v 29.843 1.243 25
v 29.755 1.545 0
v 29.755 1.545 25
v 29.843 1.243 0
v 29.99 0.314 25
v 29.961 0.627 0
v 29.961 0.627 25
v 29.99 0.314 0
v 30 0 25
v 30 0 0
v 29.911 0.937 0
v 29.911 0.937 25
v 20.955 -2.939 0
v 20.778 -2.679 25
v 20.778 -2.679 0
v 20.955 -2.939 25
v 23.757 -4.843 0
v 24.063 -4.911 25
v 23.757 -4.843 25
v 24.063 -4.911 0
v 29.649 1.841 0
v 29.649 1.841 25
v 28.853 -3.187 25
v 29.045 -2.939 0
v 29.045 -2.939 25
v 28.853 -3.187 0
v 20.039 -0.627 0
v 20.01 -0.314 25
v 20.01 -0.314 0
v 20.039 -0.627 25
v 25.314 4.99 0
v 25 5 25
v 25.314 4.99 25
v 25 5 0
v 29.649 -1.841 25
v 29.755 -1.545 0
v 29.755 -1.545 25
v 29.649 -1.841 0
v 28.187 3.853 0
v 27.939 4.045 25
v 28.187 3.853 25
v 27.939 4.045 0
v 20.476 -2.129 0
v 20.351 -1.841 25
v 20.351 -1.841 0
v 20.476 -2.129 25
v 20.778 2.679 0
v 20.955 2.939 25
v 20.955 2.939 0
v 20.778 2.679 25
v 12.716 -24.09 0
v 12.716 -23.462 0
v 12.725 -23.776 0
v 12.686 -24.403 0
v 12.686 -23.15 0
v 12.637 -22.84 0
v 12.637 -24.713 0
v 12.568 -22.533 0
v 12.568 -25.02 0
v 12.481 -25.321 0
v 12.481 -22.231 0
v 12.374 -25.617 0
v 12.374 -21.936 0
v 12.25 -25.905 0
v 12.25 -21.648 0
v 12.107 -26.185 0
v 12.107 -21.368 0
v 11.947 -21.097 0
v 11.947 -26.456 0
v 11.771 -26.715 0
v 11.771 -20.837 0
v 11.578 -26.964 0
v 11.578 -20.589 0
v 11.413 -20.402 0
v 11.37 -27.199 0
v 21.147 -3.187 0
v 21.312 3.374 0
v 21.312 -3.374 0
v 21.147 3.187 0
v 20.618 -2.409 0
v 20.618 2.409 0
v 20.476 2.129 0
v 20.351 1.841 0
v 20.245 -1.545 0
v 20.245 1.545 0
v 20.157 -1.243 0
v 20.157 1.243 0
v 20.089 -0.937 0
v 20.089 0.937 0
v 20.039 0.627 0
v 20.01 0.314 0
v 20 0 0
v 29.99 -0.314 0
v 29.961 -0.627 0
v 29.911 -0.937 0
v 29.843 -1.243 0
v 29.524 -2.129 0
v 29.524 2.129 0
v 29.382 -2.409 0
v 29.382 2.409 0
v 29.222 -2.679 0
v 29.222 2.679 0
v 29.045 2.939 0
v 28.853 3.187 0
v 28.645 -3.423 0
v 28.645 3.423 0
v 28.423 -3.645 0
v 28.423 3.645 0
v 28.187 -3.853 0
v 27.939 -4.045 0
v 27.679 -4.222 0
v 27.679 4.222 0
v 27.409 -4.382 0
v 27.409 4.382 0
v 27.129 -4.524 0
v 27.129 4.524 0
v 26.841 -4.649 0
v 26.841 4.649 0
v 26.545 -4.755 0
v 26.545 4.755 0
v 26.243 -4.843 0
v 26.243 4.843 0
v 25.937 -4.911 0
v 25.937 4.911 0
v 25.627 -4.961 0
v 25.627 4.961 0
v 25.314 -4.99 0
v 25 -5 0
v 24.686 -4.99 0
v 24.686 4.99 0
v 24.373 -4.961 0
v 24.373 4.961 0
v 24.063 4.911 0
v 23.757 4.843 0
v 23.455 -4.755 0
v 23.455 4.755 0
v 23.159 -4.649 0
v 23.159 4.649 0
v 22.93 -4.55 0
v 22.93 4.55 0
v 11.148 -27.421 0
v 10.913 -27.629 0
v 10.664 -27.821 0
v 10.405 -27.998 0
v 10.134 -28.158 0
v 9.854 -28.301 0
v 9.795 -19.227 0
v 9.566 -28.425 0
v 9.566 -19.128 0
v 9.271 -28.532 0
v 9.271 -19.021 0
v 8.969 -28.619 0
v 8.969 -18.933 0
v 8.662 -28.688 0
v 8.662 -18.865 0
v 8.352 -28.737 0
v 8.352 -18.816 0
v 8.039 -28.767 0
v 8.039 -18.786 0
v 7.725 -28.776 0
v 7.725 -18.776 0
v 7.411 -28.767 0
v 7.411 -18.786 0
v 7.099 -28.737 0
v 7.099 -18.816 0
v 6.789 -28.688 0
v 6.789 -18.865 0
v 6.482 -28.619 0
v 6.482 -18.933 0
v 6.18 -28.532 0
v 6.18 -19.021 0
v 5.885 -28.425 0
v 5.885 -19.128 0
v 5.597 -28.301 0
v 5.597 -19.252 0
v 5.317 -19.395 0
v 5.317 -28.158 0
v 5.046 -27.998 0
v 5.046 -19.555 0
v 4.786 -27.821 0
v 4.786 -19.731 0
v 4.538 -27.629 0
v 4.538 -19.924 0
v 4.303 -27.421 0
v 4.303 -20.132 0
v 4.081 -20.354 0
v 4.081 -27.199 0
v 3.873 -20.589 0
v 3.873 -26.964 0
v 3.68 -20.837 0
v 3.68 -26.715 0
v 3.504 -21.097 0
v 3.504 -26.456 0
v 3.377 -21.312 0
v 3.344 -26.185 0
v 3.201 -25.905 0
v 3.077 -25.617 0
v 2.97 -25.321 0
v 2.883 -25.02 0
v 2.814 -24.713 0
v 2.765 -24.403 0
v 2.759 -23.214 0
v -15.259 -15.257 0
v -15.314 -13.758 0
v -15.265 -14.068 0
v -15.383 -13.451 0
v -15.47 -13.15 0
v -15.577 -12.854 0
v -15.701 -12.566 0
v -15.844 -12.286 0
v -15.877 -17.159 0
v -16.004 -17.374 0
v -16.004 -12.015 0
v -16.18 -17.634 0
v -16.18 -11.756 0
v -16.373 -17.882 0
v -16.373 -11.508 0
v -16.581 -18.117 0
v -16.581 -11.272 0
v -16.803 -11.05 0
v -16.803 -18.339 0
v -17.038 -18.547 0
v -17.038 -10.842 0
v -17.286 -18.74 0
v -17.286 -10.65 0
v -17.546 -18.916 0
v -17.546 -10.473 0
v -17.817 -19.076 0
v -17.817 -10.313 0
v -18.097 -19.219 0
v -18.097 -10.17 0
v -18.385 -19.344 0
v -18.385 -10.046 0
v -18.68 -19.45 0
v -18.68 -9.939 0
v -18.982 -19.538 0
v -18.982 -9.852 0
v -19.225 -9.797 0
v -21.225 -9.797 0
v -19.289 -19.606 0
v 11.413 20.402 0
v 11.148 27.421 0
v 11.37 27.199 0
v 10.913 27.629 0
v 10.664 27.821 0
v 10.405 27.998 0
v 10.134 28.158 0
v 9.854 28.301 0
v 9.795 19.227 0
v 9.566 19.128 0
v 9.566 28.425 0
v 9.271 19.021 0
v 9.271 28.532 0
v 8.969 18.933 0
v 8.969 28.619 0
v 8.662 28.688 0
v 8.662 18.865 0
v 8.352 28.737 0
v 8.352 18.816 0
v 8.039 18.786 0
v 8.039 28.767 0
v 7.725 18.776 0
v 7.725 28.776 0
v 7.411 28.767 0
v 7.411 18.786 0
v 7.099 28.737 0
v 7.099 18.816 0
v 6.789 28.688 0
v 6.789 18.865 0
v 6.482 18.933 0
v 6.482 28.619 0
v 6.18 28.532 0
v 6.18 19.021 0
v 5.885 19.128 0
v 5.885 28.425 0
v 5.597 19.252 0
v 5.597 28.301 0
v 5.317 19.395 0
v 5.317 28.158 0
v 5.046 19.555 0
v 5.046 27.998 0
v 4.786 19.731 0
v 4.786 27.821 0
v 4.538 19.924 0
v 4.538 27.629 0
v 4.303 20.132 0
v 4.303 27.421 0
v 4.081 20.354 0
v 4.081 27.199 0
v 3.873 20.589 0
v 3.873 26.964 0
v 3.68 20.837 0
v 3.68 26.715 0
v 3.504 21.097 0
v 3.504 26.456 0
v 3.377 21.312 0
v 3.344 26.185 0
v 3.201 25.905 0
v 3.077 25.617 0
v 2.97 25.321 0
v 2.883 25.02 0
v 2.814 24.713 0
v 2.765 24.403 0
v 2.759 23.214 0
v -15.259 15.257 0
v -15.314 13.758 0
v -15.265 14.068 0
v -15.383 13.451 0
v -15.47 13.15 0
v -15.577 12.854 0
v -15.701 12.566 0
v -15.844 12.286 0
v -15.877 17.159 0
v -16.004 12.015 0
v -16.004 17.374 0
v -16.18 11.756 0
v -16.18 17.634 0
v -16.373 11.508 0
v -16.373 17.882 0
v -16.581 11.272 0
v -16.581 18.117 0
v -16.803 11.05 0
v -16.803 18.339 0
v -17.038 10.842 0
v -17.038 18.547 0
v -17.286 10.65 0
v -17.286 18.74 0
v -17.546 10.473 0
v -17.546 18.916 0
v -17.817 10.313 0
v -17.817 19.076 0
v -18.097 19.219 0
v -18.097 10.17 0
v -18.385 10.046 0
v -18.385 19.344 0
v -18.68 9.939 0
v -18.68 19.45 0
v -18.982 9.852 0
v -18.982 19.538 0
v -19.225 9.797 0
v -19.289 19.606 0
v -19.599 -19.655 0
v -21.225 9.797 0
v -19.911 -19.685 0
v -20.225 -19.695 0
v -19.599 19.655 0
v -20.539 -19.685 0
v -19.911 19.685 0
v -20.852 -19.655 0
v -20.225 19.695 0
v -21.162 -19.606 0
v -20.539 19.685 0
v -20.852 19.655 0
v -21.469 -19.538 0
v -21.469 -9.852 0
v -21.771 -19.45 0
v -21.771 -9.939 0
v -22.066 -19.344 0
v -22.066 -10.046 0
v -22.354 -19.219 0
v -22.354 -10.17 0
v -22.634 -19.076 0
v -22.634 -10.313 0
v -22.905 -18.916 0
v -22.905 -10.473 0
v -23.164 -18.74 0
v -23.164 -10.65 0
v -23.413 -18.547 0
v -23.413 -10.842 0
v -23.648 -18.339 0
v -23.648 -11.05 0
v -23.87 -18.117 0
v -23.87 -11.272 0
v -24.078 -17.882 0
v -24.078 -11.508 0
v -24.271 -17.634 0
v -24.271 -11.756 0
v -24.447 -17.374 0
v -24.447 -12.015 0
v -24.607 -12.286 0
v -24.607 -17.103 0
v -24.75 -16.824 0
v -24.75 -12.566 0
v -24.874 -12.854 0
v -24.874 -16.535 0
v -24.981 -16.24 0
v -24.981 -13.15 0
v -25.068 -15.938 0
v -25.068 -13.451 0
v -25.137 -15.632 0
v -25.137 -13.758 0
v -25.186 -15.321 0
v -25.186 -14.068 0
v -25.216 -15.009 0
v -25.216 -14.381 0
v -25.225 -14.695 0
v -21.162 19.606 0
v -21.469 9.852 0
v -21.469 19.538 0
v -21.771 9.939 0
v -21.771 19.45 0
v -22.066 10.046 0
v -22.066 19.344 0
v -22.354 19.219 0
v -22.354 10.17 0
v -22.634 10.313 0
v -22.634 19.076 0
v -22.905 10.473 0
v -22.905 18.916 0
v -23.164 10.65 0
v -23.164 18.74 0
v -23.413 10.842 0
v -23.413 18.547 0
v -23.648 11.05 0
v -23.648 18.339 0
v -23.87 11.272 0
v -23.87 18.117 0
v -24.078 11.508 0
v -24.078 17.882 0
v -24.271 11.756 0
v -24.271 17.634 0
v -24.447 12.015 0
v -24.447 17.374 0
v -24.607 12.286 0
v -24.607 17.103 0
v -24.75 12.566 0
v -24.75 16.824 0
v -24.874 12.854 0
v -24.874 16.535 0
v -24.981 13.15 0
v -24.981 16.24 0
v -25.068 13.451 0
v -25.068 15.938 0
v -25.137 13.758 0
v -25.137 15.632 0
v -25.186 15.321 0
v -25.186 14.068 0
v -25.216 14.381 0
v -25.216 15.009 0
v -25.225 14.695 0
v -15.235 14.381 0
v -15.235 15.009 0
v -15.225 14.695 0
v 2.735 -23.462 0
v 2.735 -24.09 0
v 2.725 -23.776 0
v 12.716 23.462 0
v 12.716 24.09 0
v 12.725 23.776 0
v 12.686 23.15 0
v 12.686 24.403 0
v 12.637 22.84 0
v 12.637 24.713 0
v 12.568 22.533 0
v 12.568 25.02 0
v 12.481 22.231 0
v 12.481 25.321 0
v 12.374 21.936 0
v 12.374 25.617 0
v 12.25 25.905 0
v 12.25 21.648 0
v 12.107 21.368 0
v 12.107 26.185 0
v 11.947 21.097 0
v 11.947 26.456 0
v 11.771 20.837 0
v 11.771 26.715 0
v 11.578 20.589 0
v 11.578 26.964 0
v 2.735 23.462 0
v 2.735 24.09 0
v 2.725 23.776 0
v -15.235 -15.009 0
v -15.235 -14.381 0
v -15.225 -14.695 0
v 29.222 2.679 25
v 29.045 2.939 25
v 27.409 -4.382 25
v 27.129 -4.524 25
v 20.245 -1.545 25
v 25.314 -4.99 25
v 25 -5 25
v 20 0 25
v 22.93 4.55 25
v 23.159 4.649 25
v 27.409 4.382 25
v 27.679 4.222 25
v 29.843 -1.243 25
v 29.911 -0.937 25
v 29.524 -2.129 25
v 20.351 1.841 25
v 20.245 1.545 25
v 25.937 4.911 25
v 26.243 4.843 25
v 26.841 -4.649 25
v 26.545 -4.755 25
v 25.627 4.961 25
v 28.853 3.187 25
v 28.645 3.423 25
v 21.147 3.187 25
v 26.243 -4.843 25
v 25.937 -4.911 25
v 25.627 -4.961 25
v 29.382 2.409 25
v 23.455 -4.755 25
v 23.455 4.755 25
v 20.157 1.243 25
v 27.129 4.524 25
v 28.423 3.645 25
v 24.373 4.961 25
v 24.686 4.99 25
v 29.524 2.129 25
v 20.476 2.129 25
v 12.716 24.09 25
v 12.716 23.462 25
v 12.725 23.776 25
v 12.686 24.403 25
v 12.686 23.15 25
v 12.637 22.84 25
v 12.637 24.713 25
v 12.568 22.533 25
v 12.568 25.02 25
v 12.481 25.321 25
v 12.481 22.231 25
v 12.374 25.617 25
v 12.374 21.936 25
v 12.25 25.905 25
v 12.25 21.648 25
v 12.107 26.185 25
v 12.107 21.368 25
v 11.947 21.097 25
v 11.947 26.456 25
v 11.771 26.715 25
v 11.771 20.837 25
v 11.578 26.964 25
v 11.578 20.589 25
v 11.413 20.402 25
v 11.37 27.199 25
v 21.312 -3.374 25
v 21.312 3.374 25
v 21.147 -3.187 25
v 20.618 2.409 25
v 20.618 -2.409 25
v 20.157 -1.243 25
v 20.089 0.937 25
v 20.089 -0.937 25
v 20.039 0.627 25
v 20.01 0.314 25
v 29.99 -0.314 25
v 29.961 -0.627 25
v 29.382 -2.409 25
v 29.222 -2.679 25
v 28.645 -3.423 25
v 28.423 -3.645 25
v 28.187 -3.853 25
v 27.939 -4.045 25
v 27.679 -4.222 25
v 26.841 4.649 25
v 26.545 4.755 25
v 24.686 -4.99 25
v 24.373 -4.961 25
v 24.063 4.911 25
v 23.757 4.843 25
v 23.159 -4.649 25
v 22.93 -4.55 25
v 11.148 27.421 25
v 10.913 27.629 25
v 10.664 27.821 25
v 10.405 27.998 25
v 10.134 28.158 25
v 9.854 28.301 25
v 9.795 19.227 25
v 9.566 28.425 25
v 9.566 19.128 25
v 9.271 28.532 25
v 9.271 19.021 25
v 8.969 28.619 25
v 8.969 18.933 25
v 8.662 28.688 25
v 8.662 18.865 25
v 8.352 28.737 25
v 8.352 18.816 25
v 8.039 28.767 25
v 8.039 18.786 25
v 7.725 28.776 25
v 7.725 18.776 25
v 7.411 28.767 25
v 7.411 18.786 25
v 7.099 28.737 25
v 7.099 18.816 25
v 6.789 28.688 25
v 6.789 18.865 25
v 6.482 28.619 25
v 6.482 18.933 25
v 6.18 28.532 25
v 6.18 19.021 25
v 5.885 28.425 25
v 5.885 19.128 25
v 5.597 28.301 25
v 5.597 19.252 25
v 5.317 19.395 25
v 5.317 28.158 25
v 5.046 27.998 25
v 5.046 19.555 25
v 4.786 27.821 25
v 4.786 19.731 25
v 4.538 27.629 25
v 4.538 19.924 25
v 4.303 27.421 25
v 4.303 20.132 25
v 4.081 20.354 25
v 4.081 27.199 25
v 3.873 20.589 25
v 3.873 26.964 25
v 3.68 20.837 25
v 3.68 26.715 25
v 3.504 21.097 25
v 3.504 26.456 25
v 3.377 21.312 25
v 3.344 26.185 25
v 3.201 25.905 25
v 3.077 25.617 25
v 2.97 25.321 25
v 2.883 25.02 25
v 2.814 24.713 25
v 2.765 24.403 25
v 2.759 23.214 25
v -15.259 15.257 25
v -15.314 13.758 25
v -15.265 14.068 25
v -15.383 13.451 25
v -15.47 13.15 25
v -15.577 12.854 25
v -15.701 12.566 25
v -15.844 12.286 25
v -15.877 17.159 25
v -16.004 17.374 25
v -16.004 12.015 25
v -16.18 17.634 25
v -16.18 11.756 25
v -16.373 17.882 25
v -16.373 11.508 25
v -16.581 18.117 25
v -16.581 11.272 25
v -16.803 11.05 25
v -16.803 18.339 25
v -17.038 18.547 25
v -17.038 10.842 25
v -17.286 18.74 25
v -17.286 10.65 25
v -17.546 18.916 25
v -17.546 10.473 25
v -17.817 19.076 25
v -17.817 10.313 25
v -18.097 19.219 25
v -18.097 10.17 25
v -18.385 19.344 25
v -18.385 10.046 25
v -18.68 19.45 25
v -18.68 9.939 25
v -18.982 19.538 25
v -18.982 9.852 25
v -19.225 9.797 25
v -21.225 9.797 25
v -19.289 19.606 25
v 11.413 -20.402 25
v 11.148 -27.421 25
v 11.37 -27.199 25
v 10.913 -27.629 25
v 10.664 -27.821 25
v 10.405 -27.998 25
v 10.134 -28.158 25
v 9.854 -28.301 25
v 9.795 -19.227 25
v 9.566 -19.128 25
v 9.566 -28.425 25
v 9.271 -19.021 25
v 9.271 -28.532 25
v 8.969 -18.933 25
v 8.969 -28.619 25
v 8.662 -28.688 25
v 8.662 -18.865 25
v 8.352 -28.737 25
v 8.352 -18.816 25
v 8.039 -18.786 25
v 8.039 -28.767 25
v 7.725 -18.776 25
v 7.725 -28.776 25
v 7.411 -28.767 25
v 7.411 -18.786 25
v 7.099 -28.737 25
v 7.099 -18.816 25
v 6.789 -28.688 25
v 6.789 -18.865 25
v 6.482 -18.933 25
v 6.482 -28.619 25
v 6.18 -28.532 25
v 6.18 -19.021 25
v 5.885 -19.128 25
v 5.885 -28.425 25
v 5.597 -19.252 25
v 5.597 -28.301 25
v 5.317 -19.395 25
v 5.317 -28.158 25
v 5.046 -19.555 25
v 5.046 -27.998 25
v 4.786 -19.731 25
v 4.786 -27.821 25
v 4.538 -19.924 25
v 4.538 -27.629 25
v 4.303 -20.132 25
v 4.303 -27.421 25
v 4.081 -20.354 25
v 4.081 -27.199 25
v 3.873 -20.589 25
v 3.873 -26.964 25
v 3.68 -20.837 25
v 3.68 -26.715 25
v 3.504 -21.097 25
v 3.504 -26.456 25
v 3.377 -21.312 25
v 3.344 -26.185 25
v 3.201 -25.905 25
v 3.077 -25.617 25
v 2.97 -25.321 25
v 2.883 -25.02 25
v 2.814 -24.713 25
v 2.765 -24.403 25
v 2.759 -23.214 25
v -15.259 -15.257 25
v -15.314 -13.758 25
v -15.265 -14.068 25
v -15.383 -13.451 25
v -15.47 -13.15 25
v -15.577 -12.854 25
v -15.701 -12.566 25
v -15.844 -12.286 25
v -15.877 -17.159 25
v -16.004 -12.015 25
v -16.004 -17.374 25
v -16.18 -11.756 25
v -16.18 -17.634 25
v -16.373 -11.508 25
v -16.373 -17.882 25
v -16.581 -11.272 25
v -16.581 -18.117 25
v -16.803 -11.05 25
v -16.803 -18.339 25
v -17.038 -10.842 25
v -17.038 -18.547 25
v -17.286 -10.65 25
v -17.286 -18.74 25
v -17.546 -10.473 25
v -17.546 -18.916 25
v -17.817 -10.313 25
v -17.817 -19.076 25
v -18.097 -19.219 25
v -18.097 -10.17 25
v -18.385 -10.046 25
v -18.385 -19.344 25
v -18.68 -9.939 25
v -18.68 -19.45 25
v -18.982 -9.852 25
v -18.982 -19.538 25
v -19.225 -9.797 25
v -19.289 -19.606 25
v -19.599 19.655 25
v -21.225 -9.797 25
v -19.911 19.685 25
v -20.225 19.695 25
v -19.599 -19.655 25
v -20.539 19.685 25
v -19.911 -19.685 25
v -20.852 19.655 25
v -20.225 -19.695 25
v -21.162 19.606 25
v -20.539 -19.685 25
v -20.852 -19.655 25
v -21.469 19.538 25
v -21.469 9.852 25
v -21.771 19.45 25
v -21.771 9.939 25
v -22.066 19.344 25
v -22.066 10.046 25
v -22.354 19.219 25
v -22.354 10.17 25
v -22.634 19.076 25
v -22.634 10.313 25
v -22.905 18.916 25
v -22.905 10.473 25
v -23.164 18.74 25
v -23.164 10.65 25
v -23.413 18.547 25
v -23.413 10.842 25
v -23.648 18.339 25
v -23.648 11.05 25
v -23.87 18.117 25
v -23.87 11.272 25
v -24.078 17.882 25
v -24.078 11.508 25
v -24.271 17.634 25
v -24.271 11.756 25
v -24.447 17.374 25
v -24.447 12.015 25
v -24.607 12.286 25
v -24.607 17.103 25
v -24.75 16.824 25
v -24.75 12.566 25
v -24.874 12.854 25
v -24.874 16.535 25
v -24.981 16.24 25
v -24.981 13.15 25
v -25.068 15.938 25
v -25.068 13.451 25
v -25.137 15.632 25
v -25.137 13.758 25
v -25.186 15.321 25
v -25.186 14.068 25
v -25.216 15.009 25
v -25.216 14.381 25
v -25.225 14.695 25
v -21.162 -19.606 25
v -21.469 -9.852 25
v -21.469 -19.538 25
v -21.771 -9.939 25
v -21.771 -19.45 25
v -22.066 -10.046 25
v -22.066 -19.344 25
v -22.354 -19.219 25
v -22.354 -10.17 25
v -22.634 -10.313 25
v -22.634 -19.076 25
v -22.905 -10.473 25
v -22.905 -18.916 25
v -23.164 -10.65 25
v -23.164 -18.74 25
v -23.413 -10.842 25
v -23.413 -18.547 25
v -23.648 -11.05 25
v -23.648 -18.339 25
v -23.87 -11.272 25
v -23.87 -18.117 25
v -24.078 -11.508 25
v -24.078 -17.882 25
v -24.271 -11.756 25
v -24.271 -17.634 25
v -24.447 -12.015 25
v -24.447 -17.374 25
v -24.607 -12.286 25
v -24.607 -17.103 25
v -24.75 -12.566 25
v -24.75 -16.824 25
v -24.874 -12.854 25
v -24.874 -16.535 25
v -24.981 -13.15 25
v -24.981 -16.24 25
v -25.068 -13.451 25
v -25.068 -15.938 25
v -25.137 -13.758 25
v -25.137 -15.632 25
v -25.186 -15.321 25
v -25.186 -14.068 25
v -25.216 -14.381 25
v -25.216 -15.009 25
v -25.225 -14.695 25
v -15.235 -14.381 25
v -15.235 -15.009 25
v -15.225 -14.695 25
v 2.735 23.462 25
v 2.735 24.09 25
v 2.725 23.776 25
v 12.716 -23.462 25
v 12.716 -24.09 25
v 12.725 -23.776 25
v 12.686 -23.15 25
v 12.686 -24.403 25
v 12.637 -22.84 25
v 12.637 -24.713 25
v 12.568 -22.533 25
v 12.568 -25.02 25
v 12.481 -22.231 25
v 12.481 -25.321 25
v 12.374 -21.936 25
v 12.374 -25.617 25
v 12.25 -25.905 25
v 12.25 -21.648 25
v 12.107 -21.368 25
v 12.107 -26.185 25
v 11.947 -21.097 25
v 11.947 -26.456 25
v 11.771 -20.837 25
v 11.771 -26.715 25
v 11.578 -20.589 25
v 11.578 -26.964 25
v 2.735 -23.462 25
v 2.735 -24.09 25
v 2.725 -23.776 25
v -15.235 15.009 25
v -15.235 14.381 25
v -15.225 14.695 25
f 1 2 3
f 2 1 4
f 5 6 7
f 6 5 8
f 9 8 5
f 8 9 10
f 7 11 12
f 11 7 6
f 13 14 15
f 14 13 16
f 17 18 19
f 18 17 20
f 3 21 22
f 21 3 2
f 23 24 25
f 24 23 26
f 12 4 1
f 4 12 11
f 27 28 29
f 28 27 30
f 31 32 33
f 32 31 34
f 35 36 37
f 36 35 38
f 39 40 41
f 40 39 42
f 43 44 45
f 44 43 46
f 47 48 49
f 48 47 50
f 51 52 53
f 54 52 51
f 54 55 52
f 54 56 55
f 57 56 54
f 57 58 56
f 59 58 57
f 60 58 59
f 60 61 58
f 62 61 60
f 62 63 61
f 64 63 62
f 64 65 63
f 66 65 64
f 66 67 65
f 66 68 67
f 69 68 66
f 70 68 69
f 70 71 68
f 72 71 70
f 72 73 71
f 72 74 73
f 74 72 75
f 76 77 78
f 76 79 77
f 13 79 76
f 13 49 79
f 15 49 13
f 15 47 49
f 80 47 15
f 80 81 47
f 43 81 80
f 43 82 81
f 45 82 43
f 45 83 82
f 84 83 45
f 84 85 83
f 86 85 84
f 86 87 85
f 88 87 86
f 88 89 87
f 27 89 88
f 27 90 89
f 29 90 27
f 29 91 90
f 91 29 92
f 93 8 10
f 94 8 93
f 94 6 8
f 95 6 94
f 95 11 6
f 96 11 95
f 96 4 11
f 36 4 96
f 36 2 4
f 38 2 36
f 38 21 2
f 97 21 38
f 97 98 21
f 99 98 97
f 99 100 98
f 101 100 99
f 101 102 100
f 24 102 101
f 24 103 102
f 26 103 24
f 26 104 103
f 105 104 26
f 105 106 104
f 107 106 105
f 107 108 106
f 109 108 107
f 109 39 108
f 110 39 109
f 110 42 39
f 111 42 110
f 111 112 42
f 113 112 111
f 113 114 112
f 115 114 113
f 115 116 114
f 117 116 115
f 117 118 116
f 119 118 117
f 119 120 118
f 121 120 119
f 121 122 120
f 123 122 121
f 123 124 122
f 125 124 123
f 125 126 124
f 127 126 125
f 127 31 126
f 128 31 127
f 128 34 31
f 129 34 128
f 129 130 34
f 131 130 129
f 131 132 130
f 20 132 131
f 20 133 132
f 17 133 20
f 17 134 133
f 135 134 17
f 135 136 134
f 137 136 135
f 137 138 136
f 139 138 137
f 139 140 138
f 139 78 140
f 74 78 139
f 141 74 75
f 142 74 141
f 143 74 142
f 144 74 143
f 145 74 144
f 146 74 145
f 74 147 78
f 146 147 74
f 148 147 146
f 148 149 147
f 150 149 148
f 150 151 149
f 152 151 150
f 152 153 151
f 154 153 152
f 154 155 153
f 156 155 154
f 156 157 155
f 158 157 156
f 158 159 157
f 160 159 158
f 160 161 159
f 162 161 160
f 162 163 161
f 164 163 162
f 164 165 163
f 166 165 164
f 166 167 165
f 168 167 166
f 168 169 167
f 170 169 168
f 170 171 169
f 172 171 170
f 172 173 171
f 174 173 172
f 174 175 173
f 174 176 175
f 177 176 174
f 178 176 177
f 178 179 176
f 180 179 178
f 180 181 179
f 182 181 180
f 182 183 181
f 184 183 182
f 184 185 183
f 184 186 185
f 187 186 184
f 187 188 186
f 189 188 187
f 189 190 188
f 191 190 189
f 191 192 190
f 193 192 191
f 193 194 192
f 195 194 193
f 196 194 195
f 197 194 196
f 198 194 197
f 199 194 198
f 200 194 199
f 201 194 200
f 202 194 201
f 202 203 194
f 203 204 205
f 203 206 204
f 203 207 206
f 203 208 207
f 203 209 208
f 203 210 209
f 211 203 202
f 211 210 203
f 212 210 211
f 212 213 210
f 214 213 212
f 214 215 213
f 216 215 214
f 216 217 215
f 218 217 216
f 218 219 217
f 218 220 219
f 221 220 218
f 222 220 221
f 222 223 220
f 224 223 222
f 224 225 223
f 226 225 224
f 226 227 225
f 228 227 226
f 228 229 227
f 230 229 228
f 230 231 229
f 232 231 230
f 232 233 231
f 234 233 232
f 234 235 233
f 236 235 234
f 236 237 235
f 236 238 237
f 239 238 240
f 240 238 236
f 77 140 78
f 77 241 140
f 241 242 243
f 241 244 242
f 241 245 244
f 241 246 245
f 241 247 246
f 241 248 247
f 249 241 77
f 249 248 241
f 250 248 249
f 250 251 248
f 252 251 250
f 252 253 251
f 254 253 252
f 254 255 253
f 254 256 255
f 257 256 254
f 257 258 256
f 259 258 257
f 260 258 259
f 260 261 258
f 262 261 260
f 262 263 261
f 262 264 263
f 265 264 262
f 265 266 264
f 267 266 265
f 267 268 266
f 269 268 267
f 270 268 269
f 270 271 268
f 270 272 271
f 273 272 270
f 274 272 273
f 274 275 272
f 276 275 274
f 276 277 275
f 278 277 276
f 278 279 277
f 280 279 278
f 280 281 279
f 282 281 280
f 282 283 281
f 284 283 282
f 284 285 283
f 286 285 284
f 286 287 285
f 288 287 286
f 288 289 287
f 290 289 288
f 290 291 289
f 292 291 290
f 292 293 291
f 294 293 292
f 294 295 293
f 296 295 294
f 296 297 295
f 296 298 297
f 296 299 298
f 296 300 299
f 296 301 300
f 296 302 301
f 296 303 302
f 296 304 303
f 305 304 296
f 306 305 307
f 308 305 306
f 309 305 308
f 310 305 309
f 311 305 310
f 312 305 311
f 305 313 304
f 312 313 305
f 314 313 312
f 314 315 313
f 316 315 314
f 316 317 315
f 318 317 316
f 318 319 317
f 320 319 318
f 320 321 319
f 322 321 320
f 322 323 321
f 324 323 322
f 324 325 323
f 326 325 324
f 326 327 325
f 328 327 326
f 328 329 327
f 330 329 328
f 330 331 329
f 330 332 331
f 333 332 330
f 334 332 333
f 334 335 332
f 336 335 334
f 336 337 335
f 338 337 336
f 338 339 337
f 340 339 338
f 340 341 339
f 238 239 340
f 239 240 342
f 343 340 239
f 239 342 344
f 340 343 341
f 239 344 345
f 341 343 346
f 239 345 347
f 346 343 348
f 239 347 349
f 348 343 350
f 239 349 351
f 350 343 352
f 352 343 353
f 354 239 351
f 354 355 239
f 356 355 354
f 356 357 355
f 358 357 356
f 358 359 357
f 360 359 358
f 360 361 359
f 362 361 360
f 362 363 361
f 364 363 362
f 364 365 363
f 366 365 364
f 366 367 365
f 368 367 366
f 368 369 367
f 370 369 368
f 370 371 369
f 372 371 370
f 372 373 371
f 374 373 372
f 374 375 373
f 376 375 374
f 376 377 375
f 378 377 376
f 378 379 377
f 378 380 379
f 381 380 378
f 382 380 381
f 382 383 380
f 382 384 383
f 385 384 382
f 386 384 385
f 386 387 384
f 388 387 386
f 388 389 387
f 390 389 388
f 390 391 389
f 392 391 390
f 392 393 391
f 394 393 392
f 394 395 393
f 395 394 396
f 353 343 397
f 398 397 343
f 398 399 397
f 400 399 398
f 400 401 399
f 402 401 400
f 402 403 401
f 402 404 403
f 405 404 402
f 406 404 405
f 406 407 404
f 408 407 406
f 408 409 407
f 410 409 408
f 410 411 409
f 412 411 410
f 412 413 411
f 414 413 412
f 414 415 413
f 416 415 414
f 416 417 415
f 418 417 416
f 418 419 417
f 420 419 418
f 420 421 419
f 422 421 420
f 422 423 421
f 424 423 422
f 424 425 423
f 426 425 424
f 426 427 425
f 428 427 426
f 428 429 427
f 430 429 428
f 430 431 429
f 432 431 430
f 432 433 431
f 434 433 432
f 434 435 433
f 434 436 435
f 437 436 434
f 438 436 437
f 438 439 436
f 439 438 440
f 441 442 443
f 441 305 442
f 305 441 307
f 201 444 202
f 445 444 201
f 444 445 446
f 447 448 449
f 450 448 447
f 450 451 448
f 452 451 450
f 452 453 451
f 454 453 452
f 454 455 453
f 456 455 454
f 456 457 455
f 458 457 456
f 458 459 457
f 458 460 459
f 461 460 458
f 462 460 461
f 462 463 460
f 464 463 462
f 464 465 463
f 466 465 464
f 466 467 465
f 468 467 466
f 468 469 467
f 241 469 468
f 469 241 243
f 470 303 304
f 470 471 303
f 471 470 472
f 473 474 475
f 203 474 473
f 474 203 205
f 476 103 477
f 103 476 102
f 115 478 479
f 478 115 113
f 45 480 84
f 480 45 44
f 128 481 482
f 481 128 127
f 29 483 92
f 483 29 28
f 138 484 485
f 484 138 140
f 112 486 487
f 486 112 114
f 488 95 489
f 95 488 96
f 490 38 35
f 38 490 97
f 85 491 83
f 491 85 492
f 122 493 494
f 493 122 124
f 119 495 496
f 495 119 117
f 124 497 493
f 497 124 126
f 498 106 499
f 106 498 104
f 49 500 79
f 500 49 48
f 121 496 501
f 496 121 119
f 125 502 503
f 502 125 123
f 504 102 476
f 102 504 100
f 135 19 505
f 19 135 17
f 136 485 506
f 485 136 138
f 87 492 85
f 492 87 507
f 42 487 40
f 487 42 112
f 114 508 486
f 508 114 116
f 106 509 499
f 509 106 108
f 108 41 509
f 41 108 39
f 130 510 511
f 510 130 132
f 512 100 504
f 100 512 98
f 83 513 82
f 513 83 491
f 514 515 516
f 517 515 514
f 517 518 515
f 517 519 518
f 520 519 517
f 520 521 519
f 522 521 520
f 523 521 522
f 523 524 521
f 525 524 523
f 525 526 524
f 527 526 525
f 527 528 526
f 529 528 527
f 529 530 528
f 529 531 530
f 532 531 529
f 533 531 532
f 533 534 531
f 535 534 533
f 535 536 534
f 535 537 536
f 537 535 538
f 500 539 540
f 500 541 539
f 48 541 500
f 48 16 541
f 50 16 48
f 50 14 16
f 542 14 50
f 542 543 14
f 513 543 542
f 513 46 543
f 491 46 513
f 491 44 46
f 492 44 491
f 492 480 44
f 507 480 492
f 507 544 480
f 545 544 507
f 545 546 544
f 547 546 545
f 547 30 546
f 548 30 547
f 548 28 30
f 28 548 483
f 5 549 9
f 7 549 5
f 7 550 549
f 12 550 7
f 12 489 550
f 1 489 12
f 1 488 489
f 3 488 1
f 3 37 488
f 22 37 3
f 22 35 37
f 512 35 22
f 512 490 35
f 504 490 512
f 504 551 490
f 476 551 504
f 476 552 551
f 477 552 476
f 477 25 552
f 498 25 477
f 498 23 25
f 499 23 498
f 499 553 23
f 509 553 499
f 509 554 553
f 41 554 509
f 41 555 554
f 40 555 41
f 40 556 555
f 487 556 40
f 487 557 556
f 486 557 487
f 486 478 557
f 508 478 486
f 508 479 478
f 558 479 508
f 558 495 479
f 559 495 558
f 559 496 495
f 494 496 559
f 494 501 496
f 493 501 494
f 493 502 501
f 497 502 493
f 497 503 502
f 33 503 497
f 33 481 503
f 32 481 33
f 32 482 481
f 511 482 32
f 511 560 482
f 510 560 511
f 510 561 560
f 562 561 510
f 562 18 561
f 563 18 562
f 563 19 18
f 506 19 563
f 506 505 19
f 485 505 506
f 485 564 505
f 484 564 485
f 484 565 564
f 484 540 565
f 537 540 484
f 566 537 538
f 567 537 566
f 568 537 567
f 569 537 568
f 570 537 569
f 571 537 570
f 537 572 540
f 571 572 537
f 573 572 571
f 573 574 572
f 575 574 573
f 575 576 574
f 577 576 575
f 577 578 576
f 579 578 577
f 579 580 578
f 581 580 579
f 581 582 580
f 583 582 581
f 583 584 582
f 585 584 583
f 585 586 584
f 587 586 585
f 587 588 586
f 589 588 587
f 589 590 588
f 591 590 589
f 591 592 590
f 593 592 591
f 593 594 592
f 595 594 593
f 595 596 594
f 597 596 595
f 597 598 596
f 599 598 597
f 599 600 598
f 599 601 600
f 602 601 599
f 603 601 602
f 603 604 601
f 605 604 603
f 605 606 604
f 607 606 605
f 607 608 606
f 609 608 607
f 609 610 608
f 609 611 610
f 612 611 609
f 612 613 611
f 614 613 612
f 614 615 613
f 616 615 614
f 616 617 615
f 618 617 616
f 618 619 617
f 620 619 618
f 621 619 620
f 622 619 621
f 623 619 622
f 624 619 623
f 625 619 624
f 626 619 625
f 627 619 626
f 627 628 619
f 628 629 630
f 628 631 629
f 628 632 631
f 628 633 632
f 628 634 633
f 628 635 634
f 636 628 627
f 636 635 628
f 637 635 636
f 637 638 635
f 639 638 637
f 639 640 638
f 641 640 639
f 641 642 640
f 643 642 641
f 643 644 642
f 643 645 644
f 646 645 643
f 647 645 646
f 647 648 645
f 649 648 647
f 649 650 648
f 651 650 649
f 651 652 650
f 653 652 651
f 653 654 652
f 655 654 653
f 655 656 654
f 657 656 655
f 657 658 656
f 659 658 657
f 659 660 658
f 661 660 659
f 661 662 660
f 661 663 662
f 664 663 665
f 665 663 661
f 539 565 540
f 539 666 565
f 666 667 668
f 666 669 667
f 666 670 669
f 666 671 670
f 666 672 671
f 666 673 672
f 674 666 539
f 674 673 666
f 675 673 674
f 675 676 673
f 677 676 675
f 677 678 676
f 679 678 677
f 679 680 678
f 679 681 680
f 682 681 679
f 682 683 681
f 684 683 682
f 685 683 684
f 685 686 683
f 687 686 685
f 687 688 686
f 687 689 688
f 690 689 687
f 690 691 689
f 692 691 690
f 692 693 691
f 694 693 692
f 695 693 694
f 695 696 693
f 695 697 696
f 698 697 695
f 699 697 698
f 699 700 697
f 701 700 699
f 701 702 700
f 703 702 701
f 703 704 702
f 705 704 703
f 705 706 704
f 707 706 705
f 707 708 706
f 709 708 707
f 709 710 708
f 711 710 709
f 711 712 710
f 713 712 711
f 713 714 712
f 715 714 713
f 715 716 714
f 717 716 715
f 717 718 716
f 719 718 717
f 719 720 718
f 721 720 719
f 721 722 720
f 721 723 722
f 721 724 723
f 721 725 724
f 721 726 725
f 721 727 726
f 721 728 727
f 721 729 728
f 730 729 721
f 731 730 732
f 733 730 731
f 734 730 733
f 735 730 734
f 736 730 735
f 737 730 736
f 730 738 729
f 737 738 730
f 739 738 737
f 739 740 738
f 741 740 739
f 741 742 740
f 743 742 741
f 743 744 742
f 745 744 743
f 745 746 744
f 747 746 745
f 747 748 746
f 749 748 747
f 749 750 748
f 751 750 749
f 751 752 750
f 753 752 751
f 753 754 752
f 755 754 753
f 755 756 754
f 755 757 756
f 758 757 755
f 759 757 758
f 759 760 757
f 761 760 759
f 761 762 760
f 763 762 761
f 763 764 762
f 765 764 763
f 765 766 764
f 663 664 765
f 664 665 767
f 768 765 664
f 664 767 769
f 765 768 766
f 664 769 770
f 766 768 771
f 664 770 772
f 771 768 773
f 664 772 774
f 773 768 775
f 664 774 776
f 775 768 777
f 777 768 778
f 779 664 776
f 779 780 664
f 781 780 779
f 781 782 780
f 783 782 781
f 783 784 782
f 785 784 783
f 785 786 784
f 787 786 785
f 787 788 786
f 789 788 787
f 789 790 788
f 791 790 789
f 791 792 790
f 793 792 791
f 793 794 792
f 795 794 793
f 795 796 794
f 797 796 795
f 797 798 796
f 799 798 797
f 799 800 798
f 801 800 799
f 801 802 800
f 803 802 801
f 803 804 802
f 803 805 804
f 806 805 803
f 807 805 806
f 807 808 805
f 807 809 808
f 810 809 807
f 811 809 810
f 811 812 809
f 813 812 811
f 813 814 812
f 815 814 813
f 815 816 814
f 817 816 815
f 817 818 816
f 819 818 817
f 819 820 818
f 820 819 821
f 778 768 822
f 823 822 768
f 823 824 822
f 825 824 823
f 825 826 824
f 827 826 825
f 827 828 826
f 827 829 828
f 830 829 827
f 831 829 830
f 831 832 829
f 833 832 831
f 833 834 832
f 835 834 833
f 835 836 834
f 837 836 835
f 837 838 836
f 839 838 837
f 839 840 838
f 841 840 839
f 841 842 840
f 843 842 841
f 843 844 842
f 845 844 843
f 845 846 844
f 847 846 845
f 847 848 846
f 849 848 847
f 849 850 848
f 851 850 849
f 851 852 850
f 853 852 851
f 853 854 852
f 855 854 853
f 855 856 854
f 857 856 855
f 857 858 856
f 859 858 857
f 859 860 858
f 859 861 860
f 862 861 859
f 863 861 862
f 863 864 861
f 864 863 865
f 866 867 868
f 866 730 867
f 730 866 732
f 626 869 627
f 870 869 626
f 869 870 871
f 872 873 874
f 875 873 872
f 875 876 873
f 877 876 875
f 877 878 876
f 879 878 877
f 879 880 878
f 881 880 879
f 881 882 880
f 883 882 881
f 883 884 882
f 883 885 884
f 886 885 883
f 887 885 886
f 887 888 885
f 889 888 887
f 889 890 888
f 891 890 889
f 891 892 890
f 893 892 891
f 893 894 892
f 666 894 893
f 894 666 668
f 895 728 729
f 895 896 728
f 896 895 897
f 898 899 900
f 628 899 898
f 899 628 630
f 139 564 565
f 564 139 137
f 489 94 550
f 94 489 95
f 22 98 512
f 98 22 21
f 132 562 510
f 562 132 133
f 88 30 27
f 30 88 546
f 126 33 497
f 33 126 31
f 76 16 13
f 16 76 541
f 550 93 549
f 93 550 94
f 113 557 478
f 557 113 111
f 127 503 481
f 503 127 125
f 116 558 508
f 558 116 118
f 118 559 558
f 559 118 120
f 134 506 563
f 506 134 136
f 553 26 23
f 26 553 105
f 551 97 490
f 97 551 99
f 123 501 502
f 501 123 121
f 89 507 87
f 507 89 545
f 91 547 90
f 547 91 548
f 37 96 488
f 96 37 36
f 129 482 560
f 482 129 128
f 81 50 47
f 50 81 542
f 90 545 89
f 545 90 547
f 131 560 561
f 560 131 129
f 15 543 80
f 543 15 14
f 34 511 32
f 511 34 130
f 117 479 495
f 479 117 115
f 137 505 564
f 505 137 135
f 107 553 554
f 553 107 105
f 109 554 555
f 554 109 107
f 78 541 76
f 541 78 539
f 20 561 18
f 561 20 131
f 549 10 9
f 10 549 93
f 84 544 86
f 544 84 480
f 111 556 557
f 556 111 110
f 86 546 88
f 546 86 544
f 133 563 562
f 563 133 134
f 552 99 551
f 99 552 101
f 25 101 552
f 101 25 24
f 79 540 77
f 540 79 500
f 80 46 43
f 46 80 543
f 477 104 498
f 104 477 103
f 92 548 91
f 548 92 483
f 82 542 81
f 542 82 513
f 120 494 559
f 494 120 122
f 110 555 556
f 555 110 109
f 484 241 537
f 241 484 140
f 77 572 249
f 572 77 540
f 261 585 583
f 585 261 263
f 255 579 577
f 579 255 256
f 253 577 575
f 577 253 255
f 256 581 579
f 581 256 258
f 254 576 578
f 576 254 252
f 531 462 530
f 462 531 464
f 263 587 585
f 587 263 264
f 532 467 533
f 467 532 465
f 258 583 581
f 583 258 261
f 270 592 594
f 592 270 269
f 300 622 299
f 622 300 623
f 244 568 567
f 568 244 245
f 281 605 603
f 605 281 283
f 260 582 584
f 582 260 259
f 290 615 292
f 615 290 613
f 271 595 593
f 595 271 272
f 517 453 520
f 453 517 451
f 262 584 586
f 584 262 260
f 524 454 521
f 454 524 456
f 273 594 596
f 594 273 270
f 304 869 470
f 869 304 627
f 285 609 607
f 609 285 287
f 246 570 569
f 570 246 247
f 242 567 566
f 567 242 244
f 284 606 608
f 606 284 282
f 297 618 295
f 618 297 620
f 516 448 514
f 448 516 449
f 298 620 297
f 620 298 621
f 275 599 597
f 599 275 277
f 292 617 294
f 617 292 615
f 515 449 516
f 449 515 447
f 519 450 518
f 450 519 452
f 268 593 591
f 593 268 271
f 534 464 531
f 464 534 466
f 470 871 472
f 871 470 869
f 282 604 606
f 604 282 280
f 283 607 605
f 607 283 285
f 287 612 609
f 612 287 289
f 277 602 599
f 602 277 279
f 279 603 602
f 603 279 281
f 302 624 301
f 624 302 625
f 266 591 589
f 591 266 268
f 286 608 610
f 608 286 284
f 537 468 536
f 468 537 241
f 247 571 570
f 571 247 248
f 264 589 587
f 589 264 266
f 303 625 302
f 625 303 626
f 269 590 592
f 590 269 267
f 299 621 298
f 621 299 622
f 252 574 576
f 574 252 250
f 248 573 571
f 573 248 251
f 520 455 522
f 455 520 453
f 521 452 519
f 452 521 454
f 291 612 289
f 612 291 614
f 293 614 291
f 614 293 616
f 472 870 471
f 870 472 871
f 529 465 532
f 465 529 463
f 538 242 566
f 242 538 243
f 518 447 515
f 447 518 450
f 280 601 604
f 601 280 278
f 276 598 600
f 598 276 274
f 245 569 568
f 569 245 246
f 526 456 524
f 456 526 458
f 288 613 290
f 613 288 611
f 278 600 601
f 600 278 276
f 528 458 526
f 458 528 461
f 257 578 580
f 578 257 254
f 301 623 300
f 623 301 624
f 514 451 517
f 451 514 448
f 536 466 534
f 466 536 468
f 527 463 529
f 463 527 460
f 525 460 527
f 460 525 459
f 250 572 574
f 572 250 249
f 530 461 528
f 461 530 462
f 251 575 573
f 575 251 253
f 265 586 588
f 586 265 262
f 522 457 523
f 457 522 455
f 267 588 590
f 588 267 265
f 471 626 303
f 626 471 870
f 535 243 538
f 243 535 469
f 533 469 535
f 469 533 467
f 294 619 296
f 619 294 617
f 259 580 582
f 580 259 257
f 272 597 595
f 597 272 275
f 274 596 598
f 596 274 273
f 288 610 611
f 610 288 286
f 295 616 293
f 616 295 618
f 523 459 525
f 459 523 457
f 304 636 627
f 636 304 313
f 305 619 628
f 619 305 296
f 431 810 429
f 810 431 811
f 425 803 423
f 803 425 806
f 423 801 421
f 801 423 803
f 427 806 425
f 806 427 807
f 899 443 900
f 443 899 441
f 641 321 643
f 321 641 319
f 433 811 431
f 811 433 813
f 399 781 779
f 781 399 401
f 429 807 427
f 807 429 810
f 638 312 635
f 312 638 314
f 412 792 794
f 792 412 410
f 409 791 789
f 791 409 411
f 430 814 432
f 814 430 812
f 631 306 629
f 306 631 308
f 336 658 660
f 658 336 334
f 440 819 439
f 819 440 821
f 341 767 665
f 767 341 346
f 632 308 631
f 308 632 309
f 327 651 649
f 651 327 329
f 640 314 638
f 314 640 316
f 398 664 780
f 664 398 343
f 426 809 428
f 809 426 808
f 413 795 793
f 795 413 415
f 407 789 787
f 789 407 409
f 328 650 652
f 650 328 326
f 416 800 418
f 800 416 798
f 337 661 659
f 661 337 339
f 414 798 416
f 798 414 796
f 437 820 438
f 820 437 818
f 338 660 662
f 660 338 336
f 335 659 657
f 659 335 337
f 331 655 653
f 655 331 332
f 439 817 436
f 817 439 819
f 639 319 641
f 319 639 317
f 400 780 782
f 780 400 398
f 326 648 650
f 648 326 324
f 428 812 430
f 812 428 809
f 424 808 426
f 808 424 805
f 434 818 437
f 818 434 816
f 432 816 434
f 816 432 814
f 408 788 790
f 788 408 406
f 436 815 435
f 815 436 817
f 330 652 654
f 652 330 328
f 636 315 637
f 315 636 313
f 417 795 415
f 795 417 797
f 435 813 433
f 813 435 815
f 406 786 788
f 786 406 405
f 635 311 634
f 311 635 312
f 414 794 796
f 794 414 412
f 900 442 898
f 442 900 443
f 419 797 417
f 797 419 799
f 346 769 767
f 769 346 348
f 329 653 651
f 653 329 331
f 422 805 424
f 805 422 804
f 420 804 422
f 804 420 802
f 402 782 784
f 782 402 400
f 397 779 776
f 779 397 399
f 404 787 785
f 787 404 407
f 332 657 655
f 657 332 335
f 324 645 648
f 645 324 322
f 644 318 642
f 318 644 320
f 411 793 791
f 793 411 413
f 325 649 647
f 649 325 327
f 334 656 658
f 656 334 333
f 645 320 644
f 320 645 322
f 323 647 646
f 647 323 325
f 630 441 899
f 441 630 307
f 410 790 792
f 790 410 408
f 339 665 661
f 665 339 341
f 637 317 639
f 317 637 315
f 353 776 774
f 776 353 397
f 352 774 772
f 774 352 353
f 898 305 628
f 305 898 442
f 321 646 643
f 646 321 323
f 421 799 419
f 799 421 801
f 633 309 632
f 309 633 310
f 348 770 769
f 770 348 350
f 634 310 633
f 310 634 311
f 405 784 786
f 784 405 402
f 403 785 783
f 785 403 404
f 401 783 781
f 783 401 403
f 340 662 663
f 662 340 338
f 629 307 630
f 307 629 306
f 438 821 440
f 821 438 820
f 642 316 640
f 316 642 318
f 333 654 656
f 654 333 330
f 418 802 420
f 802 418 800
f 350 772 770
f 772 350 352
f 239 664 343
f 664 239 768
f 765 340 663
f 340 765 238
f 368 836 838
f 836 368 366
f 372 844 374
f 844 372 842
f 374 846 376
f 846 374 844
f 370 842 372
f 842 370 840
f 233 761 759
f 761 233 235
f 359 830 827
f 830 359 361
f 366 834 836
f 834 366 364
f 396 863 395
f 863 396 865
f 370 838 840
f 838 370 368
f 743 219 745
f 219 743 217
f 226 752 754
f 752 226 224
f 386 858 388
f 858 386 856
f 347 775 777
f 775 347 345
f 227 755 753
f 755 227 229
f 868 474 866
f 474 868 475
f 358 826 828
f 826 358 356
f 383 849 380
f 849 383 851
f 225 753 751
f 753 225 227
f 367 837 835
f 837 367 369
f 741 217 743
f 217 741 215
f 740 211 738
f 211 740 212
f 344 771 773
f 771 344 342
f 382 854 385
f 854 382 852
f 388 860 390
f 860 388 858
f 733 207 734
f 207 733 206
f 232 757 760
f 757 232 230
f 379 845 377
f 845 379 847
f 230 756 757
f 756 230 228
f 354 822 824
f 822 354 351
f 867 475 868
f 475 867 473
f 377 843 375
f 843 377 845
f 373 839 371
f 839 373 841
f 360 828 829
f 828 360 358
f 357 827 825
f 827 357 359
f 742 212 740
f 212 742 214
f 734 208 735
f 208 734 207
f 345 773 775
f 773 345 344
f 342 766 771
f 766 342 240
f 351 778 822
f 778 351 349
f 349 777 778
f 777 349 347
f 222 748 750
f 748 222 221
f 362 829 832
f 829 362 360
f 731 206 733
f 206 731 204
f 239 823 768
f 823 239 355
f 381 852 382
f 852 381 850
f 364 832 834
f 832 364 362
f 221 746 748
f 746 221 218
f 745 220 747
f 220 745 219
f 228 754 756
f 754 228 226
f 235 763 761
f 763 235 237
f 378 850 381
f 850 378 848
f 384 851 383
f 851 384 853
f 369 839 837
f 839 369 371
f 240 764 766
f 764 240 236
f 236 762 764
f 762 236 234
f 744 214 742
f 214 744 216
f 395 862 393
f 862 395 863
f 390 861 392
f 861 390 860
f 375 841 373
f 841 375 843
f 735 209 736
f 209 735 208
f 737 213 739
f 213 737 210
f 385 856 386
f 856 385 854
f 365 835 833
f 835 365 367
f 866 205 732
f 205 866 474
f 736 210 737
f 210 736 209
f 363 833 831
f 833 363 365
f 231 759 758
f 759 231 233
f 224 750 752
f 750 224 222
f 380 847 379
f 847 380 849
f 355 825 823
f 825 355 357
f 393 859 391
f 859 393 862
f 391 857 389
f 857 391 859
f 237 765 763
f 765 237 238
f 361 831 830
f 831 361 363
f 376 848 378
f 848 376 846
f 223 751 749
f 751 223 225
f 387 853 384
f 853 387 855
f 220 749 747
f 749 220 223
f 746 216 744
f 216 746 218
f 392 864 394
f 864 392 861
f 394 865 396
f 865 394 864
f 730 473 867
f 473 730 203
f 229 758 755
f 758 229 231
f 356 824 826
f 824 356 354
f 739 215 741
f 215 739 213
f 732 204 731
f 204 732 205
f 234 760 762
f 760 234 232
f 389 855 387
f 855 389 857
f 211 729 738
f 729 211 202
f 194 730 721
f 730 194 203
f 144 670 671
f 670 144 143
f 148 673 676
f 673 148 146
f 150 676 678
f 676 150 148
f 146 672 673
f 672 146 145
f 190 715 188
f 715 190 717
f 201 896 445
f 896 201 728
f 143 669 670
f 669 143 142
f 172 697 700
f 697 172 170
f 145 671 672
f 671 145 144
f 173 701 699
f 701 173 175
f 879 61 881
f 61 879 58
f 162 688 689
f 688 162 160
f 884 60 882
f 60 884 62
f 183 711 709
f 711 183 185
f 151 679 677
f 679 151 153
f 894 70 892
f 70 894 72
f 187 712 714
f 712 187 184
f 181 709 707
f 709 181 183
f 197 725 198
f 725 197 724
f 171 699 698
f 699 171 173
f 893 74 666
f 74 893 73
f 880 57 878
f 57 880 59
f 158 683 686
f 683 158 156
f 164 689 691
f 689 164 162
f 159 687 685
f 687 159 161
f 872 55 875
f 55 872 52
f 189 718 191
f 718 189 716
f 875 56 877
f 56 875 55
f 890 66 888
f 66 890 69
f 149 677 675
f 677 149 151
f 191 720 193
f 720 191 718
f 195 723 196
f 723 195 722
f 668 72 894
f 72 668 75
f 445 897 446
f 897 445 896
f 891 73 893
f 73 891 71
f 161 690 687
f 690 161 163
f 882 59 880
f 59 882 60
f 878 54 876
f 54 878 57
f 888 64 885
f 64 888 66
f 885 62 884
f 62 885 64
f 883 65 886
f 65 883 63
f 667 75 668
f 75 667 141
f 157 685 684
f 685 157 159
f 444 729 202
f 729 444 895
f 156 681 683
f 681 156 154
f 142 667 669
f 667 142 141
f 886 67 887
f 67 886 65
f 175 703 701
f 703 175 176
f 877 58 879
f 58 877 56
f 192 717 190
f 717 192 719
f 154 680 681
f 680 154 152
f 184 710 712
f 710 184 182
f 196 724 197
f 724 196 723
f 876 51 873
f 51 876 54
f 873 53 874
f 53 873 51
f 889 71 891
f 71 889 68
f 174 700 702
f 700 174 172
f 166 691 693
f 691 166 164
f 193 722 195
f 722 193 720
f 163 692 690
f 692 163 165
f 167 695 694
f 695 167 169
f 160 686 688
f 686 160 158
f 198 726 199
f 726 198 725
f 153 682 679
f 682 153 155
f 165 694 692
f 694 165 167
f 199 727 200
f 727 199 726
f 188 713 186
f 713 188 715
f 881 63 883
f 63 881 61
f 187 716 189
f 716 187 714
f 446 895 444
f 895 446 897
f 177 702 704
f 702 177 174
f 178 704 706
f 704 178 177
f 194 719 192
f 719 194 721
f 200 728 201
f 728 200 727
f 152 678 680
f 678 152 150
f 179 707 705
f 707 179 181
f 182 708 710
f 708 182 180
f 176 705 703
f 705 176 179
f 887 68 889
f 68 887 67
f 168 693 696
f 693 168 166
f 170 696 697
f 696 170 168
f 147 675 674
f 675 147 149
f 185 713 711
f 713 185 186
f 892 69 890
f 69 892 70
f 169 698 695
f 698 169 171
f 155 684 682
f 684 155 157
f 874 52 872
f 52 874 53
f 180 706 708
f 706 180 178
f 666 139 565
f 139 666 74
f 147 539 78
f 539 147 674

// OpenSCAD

// RING 

//Adjust the radius.
r_cyl 		= 5; // [1:30]
//Adjust the height.
h_cyl 		= 25; // [1:50]

//Adjust the radius.
r_ring 		= 25; // [1:100]
//Number of cylinders.
v_nbr_cyl 	= 5; // [1:50]
//Adjust the thickness.
e_cube		= 2; // [1:50]


$fn=100;

for (nb = [0: v_nbr_cyl]) 
{
    rotate(360*nb/v_nbr_cyl,[0,0,1])
    translate([r_ring, 0, 0])
    {		
    	cylinder(r= r_cyl, h= h_cyl);
		rotate(90+180/v_nbr_cyl,[0,0,1])
		translate(v=[0,-e_cube/2,0])
    	cube([2*cos((180/v_nbr_cyl)-90)*r_ring,e_cube,h_cyl]);   
    }
}


